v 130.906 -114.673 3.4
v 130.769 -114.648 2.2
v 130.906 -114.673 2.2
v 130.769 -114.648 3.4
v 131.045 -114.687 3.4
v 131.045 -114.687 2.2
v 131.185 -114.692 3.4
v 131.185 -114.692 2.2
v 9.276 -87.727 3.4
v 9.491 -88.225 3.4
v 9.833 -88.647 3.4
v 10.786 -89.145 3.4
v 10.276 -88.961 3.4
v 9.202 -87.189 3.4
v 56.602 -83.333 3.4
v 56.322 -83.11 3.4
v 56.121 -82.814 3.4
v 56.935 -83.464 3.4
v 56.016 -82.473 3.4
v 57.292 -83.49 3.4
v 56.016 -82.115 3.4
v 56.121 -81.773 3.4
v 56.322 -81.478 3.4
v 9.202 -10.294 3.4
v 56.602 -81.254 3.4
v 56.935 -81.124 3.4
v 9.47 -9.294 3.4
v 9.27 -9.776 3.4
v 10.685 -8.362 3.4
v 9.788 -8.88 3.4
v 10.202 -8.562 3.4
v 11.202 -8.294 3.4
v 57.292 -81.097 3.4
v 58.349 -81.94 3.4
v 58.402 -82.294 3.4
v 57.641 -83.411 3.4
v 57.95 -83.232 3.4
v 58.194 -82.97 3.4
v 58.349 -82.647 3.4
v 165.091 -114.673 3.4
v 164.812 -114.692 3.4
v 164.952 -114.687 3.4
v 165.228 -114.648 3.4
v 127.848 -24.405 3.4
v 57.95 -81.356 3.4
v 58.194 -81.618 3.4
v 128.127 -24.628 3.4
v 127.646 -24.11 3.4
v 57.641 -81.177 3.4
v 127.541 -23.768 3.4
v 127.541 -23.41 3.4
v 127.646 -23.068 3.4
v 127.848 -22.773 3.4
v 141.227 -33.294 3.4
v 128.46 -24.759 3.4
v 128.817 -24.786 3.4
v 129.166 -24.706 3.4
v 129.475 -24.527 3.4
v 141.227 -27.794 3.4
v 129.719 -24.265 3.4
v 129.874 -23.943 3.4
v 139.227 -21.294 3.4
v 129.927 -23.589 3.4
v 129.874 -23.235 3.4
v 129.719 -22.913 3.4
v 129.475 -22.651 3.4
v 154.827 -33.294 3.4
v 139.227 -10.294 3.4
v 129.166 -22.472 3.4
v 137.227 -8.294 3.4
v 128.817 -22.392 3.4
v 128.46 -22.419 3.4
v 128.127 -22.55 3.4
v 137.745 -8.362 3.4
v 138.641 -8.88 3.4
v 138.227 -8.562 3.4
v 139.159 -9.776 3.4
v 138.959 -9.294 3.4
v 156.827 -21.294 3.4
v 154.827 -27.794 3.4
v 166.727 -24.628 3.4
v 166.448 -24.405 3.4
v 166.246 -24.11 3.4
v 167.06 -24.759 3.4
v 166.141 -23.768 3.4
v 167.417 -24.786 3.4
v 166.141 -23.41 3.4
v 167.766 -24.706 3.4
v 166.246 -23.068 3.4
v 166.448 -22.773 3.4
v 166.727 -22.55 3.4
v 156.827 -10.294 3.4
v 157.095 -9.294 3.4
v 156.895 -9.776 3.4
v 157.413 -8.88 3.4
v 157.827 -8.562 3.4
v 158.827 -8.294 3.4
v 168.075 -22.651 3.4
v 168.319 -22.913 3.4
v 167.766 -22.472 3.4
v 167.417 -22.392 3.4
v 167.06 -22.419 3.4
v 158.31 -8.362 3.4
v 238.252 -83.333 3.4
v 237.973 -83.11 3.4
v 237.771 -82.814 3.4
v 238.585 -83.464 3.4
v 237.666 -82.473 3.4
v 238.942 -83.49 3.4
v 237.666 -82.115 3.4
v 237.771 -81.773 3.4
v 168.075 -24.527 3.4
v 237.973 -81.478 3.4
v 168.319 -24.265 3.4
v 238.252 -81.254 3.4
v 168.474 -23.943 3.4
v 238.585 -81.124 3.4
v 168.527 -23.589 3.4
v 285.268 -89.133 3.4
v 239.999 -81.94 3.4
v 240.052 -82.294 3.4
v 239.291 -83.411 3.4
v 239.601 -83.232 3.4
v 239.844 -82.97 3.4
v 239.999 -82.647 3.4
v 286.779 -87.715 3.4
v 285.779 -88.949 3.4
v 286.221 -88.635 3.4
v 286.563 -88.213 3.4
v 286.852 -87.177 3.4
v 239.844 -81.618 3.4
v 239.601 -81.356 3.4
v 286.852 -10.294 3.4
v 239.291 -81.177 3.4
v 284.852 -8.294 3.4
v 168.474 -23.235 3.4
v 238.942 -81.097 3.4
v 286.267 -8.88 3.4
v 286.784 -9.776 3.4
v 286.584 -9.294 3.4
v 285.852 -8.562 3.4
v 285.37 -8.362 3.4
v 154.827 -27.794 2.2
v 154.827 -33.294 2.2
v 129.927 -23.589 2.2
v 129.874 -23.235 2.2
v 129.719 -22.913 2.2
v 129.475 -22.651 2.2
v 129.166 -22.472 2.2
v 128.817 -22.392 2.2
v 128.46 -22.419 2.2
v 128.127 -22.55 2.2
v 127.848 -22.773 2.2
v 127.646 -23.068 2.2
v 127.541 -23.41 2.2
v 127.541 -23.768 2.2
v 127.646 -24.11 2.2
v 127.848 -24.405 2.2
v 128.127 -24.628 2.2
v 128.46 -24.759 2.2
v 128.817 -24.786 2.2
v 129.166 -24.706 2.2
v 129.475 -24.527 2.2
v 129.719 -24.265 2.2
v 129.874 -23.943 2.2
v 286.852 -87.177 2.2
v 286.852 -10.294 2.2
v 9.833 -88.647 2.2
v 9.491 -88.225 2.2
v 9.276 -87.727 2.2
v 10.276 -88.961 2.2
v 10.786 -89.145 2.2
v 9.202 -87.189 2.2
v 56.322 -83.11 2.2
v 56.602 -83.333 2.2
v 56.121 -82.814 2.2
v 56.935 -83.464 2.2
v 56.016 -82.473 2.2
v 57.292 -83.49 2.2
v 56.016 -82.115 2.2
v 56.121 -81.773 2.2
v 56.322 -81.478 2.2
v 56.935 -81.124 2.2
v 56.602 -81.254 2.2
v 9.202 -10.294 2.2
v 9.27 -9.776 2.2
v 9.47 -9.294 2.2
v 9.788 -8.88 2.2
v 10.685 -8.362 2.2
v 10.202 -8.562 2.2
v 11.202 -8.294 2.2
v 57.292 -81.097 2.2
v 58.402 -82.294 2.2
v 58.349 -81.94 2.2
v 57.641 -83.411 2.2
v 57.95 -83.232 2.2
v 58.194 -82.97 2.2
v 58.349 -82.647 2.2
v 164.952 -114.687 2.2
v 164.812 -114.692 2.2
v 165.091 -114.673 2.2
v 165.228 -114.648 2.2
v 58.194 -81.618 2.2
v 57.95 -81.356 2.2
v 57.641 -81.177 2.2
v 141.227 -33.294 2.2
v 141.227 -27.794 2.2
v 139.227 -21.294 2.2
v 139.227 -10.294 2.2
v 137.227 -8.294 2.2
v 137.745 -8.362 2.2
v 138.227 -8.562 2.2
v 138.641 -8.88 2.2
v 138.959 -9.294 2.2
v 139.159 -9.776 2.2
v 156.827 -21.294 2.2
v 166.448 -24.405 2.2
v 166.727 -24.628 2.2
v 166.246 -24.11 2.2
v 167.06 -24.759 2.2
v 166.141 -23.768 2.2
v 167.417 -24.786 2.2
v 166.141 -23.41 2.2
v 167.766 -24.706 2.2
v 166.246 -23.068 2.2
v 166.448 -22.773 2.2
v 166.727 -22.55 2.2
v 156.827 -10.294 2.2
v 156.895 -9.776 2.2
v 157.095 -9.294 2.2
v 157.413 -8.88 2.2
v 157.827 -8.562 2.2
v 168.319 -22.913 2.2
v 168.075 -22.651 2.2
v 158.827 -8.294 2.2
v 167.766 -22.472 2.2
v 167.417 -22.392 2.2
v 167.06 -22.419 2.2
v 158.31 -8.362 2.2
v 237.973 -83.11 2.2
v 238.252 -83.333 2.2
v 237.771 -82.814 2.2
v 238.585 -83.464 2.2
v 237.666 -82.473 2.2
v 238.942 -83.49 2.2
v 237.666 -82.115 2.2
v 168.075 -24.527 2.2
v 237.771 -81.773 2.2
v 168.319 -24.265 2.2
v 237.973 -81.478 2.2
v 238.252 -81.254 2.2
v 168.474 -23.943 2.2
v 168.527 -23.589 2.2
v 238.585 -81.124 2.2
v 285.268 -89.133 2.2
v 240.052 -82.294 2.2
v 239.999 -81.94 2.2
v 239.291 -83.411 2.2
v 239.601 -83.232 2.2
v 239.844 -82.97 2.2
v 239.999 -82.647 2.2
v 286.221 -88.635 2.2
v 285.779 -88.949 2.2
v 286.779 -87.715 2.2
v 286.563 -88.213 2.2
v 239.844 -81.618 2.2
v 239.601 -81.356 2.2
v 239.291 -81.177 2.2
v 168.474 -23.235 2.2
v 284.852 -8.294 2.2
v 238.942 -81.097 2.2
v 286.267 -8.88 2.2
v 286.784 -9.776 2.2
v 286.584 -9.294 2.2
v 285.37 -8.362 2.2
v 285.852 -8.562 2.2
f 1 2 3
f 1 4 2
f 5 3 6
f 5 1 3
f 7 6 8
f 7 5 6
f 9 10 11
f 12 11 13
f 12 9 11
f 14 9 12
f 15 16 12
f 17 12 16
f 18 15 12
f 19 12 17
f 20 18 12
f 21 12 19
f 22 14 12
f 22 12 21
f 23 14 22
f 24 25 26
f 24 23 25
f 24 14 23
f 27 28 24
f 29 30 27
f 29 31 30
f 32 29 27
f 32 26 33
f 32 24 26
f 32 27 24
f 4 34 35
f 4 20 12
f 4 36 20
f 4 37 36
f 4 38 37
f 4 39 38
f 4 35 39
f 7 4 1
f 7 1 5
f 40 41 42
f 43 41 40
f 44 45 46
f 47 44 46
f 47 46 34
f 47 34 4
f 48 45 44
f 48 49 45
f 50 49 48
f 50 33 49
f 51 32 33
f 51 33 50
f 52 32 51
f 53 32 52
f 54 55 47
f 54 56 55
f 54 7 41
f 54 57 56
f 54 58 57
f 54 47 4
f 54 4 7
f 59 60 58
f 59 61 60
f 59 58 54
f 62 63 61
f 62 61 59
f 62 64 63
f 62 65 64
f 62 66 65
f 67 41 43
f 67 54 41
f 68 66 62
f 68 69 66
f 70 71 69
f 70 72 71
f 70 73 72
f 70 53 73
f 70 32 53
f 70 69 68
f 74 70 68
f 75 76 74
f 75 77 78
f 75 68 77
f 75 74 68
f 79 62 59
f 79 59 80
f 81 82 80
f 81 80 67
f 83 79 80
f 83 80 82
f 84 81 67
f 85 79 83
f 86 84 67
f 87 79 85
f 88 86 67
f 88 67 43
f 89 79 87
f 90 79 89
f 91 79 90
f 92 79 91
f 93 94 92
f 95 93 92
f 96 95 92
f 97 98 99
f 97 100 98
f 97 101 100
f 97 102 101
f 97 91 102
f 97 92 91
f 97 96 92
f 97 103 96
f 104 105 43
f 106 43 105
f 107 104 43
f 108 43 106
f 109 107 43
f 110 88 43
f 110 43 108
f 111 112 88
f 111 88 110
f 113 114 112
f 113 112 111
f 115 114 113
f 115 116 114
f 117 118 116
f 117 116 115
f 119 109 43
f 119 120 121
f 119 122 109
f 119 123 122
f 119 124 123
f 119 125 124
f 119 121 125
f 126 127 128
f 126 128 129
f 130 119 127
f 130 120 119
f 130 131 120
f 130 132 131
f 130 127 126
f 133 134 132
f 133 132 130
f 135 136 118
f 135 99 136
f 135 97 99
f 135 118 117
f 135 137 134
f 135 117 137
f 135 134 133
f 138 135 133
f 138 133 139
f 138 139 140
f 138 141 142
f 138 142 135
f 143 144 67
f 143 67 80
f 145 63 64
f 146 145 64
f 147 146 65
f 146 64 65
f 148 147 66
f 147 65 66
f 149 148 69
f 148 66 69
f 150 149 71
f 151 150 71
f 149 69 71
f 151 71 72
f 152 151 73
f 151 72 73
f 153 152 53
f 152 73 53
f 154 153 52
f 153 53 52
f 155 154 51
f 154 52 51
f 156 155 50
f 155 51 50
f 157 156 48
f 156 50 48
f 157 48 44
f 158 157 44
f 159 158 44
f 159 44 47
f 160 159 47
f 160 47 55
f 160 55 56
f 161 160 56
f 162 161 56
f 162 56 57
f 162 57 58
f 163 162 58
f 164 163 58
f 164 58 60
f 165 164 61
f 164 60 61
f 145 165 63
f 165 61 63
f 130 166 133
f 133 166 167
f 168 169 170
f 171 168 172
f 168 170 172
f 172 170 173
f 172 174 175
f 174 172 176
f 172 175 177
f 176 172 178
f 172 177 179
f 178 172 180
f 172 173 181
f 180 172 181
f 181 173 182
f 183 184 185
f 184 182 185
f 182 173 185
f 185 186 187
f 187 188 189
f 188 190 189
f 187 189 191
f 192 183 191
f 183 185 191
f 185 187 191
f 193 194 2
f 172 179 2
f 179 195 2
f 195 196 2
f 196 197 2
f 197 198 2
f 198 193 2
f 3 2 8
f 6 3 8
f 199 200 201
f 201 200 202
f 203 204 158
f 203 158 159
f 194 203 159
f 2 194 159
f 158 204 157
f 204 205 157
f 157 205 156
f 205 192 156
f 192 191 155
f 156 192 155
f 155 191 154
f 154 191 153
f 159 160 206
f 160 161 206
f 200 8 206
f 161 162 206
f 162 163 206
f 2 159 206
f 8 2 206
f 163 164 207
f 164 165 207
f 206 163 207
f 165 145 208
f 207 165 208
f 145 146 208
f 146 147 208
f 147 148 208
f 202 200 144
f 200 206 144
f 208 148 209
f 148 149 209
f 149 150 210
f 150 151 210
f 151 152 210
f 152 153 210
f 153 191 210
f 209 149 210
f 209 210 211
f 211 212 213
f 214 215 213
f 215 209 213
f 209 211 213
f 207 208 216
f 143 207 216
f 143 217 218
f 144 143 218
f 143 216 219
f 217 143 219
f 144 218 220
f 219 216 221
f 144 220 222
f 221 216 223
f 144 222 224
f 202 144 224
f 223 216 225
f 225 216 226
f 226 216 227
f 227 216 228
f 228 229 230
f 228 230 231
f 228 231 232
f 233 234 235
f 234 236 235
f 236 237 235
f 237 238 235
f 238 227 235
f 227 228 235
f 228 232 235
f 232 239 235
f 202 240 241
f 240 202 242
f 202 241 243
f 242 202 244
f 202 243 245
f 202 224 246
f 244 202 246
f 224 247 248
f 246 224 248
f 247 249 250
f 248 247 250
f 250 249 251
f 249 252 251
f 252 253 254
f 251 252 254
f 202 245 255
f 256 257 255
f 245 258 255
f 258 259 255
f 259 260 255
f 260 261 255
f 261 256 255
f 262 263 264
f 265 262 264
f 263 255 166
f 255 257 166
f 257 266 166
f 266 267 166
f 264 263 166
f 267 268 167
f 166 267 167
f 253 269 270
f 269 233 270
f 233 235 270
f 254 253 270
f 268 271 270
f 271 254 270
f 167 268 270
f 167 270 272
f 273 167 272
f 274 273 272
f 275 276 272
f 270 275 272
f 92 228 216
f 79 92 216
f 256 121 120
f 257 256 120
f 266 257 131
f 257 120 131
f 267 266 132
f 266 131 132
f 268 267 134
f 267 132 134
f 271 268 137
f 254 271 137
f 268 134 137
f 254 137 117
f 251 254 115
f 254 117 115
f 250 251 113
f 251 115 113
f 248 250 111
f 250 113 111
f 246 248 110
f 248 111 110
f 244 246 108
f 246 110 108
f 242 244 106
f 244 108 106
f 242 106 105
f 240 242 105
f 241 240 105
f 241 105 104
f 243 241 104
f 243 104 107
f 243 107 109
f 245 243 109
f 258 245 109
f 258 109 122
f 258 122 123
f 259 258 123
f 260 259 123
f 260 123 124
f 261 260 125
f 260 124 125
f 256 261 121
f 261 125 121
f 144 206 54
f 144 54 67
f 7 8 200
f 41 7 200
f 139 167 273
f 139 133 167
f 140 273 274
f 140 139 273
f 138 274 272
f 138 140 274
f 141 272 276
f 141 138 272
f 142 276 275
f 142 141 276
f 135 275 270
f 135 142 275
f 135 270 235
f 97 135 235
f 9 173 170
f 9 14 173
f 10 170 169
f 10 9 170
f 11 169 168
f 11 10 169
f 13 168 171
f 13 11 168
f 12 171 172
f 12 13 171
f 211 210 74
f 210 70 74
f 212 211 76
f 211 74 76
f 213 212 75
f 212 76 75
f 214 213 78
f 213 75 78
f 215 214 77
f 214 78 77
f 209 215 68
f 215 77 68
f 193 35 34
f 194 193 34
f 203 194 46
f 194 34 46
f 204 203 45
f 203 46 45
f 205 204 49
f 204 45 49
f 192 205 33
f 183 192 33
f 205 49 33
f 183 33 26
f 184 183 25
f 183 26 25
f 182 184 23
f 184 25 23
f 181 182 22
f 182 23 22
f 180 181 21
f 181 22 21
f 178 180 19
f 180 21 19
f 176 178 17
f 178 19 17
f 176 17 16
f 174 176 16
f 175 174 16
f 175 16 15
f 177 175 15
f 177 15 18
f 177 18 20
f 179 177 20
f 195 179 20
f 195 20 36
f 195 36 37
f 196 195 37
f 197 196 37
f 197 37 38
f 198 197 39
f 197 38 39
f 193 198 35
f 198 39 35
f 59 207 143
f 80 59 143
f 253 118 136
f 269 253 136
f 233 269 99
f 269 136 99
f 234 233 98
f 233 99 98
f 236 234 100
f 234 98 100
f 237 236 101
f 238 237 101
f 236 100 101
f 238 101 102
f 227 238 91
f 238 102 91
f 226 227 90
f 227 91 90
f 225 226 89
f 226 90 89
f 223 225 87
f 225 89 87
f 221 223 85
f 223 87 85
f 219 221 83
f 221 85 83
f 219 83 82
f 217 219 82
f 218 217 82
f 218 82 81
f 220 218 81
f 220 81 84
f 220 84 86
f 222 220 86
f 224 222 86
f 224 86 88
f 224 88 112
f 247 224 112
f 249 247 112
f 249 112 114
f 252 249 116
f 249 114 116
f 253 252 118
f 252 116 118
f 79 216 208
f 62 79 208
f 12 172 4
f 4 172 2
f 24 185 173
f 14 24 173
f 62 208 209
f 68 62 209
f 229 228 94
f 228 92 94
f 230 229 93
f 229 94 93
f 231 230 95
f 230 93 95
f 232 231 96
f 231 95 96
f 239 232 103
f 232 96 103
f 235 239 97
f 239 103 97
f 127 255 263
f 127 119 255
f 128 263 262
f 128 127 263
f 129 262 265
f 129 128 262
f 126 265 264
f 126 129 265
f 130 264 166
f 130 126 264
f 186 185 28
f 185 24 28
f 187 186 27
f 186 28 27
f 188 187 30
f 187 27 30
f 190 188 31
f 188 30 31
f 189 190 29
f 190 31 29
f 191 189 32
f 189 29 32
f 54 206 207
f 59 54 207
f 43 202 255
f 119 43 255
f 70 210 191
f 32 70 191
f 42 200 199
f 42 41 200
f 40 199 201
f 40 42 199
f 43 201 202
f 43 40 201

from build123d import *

# Parameters (mm, degrees)
SKETCH006_W     = 13.6
SKETCH006_H     = 5.5
PAD001_DEPTH    = 1.2
FILLET001_R     = 2
SKETCH011_R     = 1.2
POCKET001_DEPTH = 1.2


with BuildPart() as part:
    # Sketch006 (on DatumPlane) → Pad001 (new body)
    with BuildSketch(Plane.XY.offset(2.2)):
        Polygon((9.202145, -8.293724), (9.202145, -88.808503), (130.974502, -114.692017), (165.022509, -114.692017), (286.852356, -88.796284), (286.852356, -8.293724), (156.82725, -8.293724), (156.82725, -21.293724), (139.22725, -21.293724), (139.22725, -8.293724), align=None)
        with Locations((148.02725, -30.543724)):
            Rectangle(SKETCH006_W, SKETCH006_H, mode=Mode.SUBTRACT)
    extrude(amount=PAD001_DEPTH)

    # Fillet001
    fillet001_edges = [part.edges().sort_by_distance(p)[0] for p in [
        (9.202145, -8.293724, 2.8),
        (9.202145, -88.808503, 2.8),
        (156.82725, -8.293724, 2.8),
        (139.22725, -8.293724, 2.8),
        (286.852356, -8.293724, 2.8),
        (130.974502, -114.692017, 2.8),
        (165.022509, -114.692017, 2.8),
        (286.852356, -88.796284, 2.8),
    ]]
    fillet(fillet001_edges, radius=FILLET001_R)

    # Sketch011 (on Face5 of Fillet001) → Pocket001 (cut)
    with BuildSketch(Plane.XY.offset(3.4)):
        with Locations((128.72725, -23.589033)):
            Circle(SKETCH011_R)
        with Locations((167.327251, -23.589033)):
            Circle(SKETCH011_R)
        with Locations((238.852356, -82.293724)):
            Circle(SKETCH011_R)
        with Locations((57.202145, -82.293724)):
            Circle(SKETCH011_R)
    extrude(amount=-POCKET001_DEPTH, mode=Mode.SUBTRACT)


solid = part.part
